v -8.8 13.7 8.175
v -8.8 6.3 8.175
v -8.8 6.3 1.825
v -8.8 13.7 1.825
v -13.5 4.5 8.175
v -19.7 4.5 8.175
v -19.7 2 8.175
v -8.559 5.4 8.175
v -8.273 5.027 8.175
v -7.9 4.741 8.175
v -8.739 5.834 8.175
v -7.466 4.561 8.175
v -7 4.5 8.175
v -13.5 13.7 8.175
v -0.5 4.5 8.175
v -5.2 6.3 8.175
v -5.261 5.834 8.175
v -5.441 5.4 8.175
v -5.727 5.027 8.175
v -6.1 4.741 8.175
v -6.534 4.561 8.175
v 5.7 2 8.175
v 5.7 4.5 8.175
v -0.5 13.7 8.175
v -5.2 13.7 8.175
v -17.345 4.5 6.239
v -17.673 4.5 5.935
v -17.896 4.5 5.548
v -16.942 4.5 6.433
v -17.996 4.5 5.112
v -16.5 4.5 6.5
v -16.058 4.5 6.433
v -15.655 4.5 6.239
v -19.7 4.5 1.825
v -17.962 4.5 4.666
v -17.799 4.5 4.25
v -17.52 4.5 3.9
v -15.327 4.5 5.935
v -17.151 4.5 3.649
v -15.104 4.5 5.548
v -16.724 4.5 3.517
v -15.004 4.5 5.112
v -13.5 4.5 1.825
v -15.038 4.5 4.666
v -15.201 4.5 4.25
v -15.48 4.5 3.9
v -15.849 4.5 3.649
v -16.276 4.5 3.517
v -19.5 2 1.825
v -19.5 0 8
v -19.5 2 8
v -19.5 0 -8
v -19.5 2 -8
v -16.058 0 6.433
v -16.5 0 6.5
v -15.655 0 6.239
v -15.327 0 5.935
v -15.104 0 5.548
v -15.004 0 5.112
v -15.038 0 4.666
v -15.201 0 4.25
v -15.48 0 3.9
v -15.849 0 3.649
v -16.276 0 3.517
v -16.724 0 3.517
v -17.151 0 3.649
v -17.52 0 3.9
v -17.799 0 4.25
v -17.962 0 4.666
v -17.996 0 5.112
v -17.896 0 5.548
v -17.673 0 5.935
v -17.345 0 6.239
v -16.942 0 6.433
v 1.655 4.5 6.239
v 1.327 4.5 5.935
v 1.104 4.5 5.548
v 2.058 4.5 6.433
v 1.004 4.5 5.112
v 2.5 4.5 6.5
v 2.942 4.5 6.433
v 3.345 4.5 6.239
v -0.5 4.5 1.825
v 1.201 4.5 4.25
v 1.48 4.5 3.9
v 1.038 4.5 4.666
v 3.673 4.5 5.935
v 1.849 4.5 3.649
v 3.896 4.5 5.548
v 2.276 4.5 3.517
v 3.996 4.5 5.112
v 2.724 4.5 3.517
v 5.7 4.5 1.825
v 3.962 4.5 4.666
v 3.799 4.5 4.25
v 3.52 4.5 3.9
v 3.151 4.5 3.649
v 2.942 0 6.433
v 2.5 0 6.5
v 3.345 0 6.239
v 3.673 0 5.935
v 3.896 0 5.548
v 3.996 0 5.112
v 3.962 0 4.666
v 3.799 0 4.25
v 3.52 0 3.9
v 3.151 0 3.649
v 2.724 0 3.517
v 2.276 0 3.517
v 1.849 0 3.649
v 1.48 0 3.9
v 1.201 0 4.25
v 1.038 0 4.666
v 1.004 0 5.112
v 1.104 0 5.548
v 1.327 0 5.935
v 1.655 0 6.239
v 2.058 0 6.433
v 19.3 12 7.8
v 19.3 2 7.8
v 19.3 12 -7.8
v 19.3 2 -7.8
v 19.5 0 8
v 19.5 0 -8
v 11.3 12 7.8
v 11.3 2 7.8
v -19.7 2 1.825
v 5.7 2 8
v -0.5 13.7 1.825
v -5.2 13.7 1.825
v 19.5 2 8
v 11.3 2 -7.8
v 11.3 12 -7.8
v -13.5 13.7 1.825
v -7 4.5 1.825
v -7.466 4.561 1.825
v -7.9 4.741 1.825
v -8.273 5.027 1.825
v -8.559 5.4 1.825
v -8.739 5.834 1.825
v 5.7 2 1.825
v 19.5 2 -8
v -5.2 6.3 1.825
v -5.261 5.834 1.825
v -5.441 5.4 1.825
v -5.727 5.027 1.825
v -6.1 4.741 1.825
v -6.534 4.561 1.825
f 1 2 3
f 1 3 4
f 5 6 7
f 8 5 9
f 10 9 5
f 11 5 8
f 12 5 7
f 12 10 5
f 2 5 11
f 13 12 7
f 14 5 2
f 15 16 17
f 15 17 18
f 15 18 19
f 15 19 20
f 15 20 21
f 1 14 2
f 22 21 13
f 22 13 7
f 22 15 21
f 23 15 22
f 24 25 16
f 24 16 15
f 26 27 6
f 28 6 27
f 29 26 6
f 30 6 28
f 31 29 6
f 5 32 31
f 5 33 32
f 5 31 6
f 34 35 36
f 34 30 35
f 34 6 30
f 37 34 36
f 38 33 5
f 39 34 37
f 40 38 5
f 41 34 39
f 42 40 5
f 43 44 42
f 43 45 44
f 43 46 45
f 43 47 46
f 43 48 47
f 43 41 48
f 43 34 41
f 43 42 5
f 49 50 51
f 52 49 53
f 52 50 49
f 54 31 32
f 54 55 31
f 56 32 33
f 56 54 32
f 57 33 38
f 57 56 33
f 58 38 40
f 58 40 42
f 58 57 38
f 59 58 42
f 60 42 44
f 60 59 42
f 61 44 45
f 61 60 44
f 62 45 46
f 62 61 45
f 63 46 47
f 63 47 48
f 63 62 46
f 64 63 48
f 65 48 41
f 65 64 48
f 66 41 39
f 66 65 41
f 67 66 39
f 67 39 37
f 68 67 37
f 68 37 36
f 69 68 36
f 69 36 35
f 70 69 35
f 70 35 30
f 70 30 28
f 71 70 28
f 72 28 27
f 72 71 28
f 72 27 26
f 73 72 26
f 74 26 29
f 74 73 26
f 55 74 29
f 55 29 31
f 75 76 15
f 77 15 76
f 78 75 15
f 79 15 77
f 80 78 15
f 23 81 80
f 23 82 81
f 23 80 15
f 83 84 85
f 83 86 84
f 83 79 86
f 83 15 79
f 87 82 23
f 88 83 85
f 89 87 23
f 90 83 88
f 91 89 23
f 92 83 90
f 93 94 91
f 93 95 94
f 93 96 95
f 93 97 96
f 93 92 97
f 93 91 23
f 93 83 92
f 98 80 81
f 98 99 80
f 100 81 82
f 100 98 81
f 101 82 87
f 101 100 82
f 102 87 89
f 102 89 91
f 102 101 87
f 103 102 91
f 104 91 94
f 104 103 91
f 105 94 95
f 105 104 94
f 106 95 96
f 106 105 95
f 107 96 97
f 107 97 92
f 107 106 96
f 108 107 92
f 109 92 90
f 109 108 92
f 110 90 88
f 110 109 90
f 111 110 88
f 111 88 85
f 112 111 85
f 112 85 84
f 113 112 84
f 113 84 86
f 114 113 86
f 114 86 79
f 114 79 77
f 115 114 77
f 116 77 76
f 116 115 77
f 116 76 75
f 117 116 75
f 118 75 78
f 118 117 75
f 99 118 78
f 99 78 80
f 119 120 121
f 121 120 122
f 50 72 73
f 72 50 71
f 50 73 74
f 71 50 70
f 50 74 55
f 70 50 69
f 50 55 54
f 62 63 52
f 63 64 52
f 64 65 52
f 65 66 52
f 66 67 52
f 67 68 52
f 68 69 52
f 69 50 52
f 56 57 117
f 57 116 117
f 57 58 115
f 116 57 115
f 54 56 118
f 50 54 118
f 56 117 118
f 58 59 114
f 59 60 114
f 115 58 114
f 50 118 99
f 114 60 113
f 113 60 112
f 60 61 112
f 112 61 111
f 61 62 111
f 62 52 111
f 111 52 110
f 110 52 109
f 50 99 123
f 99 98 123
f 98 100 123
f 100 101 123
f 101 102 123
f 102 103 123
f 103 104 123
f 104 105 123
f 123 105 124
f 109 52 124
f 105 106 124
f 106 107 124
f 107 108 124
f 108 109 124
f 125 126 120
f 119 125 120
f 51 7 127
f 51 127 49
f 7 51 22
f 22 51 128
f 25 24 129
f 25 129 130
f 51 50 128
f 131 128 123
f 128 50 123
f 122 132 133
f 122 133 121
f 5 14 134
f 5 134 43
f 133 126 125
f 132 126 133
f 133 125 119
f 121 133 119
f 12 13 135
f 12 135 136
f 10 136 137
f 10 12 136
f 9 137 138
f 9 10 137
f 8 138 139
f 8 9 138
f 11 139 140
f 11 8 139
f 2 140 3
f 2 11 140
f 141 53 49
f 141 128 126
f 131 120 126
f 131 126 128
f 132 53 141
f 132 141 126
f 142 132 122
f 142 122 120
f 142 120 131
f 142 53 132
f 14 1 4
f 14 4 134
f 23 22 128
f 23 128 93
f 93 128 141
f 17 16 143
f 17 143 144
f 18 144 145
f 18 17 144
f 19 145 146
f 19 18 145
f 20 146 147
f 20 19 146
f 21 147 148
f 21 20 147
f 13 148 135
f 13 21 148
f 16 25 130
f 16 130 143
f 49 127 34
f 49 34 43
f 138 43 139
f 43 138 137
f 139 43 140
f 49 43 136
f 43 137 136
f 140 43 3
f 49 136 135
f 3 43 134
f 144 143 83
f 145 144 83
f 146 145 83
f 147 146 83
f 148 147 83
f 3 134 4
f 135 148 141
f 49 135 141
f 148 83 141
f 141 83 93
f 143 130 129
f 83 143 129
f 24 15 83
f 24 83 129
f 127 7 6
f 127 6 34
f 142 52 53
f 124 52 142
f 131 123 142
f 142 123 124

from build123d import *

# Parameters (mm, degrees)
SKETCH1_W           = 39
SKETCH1_H           = 16
SKETCH1_R           = 1.5
BOSS_EXTRUDE1_DEPTH = 2
SKETCH3_W           = 25.4
SKETCH3_H           = 6.35
SKETCH3_R           = 1.5
BOSS_EXTRUDE2_DEPTH = 2.5
BOSS_EXTRUDE3_DEPTH = 6.35
SKETCH5_W           = 8
SKETCH5_H           = 15.6
BOSS_EXTRUDE4_DEPTH = 10


with BuildPart() as part:
    # Sketch1 → Boss-Extrude1 (new body)
    with BuildSketch(Plane(origin=(0, 0, 0), x_dir=(1, 0, 0), z_dir=(0, 1, 0))):
        Rectangle(SKETCH1_W, SKETCH1_H)
        with Locations(Location((-16.5, -5, 0), (0, 0, 270))):
            Circle(SKETCH1_R, mode=Mode.SUBTRACT)
        with Locations(Location((2.5, -5, 0), (0, 0, 270))):
            Circle(SKETCH1_R, mode=Mode.SUBTRACT)
    extrude(amount=BOSS_EXTRUDE1_DEPTH)

    # Sketch3 → Boss-Extrude2 (add)
    with BuildSketch(Plane(origin=(0, 2, 0), x_dir=(1, 0, 0), z_dir=(0, 1, 0))):
        with Locations((-7, -5)):
            Rectangle(SKETCH3_W, SKETCH3_H)
        with Locations(Location((-16.5, -5, 0), (0, 0, 270))):
            Circle(SKETCH3_R, mode=Mode.SUBTRACT)
        with Locations(Location((2.5, -5, 0), (0, 0, 270))):
            Circle(SKETCH3_R, mode=Mode.SUBTRACT)
    extrude(amount=BOSS_EXTRUDE2_DEPTH)

    # Sketch4 → Boss-Extrude3 (add)
    with BuildSketch(Plane.XY.offset(8.175)):
        with BuildLine():
            Line((-8.8, 13.7), (-13.5, 13.7))
            Line((-13.5, 13.7), (-13.5, 4.5))
            Line((-13.5, 4.5), (-6.999999998, 4.5))
            ThreePointArc((-6.999999998, 4.5), (-8.272792205, 5.027207793), (-8.8, 6.3))
            Line((-8.8, 6.3), (-8.8, 13.7))
        make_face()
        with BuildLine():
            ThreePointArc((-5.2, 6.3), (-5.727207793, 5.027207795), (-6.999999998, 4.5))
            Line((-6.999999998, 4.5), (-0.5, 4.5))
            Line((-0.5, 4.5), (-0.5, 13.7))
            Line((-0.5, 13.7), (-5.2, 13.7))
            Line((-5.2, 13.7), (-5.2, 6.3))
        make_face()
    extrude(amount=-BOSS_EXTRUDE3_DEPTH)

    # Sketch5 → Boss-Extrude4 (add)
    with BuildSketch(Plane(origin=(0, 2, 0), x_dir=(1, 0, 0), z_dir=(0, 1, 0))):
        with Locations((15.3, 0)):
            Rectangle(SKETCH5_W, SKETCH5_H)
    extrude(amount=BOSS_EXTRUDE4_DEPTH)


solid = part.part
